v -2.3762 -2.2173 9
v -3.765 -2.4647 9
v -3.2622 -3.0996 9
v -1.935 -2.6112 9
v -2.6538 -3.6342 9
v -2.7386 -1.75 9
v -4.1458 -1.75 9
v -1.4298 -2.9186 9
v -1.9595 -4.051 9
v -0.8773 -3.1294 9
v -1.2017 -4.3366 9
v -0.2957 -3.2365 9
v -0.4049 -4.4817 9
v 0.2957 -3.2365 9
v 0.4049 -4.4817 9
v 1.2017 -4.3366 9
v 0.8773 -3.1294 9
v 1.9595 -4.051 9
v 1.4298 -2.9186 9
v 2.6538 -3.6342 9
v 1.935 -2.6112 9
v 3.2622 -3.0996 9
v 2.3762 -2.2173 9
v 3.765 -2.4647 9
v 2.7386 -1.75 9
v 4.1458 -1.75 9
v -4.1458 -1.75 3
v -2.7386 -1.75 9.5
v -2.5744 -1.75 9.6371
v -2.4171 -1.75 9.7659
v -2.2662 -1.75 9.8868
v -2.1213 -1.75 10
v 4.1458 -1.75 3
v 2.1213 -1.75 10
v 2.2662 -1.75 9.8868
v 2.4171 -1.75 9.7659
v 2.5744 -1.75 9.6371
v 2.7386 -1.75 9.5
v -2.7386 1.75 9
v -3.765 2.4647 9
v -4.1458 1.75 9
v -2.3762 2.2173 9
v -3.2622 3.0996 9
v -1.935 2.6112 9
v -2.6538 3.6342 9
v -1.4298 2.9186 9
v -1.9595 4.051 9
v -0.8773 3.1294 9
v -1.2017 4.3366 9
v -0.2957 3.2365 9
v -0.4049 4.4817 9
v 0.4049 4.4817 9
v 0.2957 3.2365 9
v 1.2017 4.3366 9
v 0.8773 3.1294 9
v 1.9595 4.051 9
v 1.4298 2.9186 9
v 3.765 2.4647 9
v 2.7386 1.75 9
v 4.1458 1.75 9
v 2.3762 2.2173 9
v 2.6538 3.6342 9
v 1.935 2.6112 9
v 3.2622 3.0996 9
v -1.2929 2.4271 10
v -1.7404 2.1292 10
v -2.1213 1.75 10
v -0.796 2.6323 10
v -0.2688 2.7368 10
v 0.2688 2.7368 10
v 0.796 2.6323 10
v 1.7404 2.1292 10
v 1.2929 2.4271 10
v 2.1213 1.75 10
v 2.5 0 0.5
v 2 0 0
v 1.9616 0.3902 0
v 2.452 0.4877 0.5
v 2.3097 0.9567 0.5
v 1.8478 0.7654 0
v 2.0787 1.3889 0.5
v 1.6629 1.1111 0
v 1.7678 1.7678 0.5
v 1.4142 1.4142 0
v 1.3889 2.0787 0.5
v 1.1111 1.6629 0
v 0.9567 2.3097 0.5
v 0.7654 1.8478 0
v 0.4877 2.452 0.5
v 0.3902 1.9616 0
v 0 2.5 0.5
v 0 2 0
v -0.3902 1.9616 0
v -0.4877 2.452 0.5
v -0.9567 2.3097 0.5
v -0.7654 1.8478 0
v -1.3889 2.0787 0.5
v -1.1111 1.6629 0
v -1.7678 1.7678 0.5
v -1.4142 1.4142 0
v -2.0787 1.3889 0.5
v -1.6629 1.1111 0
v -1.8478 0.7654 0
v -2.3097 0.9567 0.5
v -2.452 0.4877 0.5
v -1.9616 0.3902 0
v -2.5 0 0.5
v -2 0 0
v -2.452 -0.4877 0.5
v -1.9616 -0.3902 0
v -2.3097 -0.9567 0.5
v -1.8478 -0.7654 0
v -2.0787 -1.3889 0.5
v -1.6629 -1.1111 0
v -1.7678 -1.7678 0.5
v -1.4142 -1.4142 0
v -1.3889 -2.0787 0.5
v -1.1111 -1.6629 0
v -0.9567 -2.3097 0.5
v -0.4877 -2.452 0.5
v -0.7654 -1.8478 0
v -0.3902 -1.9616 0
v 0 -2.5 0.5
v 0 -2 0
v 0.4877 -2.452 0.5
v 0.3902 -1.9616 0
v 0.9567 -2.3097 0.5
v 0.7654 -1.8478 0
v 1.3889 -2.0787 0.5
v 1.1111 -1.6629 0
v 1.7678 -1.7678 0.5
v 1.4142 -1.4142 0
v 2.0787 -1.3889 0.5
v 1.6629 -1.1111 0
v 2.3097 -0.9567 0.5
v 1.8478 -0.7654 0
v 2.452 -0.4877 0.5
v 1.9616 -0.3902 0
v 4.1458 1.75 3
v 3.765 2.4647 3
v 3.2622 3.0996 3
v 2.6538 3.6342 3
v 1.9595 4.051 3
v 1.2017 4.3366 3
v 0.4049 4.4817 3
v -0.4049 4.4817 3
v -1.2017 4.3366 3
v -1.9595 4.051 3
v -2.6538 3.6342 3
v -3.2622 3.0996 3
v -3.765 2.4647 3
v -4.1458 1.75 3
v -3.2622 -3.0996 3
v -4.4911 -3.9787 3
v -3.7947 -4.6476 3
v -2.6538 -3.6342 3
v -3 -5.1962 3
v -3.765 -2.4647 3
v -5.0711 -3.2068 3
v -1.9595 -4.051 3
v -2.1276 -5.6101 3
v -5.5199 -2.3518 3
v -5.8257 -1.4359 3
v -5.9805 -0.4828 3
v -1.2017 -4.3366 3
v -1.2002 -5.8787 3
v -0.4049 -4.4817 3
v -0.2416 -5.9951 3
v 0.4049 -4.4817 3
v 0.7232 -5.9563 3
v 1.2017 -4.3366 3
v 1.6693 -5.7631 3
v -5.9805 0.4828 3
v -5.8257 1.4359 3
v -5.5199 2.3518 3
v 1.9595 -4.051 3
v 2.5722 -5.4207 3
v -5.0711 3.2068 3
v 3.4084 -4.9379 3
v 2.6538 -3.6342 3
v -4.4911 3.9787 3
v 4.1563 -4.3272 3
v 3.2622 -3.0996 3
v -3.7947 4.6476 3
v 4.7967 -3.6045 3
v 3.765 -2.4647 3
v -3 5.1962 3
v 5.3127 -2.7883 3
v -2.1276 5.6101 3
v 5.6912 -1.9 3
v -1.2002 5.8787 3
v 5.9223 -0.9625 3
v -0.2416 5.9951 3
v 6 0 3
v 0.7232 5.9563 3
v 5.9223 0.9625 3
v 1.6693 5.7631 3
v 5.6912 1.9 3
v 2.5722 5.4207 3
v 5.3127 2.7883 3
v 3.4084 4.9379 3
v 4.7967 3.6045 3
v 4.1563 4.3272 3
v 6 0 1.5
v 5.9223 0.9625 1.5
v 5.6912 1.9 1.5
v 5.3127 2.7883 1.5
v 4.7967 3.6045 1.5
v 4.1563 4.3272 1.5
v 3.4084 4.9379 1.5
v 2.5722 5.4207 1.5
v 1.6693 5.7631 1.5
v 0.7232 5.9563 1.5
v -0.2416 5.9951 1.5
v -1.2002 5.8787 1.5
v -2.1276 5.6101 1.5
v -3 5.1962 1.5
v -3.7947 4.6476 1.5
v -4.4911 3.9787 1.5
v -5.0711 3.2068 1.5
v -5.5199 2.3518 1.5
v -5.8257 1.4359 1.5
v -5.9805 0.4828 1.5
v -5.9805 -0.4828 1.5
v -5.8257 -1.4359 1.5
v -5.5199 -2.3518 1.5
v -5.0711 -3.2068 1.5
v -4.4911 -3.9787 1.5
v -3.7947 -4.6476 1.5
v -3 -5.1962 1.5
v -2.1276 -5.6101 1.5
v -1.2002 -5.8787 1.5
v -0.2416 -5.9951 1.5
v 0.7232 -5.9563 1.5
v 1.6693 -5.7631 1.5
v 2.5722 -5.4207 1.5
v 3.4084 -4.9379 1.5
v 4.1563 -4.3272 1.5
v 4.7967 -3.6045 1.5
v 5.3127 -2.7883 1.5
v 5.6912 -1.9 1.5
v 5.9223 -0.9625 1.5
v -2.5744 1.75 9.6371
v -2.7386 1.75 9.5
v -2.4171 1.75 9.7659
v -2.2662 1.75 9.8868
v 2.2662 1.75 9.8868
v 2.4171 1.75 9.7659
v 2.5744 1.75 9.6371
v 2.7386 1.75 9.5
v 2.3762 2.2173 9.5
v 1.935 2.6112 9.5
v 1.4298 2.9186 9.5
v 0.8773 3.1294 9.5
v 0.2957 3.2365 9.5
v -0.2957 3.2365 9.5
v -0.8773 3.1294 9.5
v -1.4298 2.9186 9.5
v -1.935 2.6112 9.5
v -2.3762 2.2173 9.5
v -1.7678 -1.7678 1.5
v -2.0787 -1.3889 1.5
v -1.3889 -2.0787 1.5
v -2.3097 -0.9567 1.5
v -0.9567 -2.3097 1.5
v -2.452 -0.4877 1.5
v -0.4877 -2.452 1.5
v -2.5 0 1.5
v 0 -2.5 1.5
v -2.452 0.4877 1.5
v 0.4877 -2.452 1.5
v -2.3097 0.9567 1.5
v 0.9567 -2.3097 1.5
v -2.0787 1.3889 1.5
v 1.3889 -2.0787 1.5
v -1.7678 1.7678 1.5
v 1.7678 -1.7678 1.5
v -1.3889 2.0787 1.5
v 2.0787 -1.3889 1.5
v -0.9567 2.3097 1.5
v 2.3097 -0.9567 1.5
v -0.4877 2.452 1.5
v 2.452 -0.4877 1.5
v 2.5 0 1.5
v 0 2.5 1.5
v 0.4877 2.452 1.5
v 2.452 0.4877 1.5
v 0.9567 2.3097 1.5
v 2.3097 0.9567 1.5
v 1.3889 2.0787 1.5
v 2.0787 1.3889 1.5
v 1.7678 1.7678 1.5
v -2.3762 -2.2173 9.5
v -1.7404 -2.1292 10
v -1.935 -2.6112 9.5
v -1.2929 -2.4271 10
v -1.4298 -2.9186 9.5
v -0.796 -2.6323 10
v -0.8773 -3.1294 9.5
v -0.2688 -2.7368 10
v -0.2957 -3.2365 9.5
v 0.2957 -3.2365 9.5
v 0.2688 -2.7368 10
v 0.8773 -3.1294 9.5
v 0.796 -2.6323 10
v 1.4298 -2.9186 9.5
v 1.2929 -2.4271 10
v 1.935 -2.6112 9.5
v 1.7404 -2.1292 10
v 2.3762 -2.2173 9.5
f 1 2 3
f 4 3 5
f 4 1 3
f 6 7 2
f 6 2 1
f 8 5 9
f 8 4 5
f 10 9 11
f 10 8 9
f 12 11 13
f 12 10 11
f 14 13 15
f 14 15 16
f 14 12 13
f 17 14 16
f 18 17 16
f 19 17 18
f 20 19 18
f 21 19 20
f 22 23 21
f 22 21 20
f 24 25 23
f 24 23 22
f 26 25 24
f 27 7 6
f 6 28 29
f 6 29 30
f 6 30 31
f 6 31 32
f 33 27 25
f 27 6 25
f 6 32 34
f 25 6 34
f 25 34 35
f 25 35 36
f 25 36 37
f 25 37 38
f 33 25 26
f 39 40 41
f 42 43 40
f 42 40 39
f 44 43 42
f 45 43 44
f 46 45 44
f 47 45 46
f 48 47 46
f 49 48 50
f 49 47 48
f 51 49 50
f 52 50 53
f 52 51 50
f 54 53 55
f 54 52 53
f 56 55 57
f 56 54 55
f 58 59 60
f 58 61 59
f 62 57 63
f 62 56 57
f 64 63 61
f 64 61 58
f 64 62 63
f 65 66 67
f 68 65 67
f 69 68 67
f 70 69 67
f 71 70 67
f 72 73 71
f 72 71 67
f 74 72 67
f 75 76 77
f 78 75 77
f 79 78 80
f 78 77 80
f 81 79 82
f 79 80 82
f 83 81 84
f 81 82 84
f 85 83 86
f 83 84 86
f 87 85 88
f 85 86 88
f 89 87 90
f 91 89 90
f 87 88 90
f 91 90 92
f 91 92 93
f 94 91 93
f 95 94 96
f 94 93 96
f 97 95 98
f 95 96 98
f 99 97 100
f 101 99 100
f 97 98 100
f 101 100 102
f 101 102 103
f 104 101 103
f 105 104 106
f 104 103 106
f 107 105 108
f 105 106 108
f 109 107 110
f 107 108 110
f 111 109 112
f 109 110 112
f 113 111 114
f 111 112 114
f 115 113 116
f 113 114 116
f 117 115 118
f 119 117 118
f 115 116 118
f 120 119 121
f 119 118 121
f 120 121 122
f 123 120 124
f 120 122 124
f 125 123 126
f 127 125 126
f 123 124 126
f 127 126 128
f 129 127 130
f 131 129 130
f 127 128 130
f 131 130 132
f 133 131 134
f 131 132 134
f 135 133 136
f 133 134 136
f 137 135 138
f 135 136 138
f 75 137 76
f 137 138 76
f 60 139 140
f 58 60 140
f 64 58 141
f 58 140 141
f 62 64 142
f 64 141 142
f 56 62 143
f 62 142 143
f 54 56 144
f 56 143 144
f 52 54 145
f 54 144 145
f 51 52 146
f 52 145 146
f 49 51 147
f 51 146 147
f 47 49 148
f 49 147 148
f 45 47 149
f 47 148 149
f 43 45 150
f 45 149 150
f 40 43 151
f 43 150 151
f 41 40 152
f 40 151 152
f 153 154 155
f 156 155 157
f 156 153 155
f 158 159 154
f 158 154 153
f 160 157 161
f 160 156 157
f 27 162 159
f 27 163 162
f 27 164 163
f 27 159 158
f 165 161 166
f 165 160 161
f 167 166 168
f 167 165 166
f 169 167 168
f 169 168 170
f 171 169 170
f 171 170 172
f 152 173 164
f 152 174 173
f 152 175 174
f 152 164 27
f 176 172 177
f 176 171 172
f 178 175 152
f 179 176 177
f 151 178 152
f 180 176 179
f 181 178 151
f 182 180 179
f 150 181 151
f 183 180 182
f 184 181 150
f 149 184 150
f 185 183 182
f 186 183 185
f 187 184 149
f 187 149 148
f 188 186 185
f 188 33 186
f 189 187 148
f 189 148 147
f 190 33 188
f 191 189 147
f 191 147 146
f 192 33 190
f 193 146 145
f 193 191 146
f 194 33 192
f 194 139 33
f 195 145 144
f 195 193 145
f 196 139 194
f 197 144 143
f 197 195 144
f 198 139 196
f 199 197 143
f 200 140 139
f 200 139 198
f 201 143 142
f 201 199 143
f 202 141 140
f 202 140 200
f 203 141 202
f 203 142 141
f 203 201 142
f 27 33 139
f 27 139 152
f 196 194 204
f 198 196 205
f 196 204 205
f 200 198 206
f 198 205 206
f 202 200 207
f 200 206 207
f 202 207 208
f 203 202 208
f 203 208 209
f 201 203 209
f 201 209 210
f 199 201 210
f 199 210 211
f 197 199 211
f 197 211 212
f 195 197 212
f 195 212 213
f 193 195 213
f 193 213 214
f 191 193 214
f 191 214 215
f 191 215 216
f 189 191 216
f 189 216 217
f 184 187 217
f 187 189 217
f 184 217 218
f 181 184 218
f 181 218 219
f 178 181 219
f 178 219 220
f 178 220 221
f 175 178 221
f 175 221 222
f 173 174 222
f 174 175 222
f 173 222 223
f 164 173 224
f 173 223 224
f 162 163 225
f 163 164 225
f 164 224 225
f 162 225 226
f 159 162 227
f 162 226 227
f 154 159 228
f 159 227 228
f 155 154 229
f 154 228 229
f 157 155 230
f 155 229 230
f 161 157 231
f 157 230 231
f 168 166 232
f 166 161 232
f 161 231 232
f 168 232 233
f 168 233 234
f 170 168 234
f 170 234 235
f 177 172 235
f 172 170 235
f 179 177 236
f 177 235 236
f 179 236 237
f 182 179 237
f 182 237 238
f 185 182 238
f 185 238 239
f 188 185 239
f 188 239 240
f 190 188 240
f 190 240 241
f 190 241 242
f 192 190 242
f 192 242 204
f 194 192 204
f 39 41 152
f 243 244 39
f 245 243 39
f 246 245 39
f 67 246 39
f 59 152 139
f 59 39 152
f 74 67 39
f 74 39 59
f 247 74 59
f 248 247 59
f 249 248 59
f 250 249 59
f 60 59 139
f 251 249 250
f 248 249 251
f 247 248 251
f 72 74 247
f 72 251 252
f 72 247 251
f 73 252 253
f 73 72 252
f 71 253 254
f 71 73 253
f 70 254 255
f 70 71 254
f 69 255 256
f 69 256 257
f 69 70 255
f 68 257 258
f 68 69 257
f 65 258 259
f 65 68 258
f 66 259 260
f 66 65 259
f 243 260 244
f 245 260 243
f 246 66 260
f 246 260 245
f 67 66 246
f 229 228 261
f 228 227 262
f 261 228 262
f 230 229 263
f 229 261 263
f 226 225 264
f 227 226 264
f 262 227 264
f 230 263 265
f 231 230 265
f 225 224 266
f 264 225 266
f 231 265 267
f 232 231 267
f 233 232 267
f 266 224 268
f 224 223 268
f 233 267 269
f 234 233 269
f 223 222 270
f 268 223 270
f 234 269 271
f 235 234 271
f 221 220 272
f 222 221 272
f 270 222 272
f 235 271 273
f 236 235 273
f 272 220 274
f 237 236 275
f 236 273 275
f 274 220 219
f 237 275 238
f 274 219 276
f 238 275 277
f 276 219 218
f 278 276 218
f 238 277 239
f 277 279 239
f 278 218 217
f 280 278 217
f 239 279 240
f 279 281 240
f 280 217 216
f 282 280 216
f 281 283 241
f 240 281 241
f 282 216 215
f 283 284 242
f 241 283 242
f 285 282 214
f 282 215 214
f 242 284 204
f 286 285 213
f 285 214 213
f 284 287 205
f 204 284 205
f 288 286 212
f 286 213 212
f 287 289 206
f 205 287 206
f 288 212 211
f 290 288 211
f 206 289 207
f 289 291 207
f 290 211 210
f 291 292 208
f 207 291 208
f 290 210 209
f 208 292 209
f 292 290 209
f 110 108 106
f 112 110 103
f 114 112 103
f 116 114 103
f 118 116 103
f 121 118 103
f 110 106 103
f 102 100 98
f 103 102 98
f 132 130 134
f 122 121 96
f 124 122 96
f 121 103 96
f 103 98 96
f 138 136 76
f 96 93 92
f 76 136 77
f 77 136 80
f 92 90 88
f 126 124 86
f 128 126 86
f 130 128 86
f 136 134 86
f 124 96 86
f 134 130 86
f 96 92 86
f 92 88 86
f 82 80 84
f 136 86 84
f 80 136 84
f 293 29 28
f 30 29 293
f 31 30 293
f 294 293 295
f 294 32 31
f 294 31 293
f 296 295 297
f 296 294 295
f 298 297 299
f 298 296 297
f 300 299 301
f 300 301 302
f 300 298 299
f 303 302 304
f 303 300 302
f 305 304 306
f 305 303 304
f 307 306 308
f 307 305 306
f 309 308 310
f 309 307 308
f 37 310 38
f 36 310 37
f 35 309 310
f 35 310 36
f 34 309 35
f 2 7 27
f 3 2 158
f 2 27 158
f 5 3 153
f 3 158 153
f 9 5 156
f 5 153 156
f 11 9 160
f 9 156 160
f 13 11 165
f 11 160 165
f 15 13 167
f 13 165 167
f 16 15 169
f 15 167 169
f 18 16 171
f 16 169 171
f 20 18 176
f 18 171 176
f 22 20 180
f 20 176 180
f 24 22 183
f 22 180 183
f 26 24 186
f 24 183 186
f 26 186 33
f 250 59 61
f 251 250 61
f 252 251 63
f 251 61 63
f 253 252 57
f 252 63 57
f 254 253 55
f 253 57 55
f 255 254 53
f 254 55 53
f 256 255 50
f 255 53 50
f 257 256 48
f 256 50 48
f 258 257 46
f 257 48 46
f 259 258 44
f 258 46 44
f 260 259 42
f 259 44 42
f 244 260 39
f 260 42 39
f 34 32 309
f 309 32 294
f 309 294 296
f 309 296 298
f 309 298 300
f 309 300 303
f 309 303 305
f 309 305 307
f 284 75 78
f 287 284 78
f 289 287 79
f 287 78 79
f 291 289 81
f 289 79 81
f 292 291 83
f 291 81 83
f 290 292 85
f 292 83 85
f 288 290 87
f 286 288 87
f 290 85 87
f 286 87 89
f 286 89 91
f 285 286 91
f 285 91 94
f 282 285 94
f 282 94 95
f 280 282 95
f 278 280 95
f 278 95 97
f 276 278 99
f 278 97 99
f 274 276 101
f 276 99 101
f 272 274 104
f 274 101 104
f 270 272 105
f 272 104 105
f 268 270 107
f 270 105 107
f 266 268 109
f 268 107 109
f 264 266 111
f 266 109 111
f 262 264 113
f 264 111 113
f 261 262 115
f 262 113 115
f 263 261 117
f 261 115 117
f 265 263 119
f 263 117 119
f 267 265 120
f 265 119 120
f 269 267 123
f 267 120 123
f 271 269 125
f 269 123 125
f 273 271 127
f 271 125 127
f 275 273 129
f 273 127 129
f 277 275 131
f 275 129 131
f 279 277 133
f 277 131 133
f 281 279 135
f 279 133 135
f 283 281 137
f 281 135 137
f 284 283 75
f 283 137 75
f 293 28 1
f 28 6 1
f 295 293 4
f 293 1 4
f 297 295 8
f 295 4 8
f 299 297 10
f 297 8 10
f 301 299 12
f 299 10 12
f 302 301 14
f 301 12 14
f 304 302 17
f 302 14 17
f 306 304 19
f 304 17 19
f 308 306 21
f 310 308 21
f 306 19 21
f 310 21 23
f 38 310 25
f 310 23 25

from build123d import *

# Parameters (mm, degrees)
SKETCH_1_R          = 2.5
EXTRUDE_1_DEPTH     = 1.5
SKETCH_3_R          = 6
EXTRUDE_2_DEPTH     = 1.5
SKETCH_4_R          = 4.5
EXTRUDE_3_DEPTH     = 6
SKETCH_5_R          = 3.25
EXTRUDE_4_DEPTH     = 1
CHAMFER_1_SIZE      = 0.5
CUT_EXTRUDE_1_REACH = 15.115
SKETCH_6_W          = 35.44
SKETCH_6_H          = 3.5


with BuildPart() as part:
    # 草图1 → 凸台-拉伸1 (new body)
    with BuildSketch(Plane.XY):
        Circle(SKETCH_1_R)
    extrude(amount=EXTRUDE_1_DEPTH)

    # 草图3 → 凸台-拉伸2 (add)
    with BuildSketch(Plane.XY.offset(1.5)):
        Circle(SKETCH_3_R)
    extrude(amount=EXTRUDE_2_DEPTH)

    # 草图4 → 凸台-拉伸3 (add)
    with BuildSketch(Plane.XY.offset(3)):
        Circle(SKETCH_4_R)
    extrude(amount=EXTRUDE_3_DEPTH)

    # 草图5 → 凸台-拉伸4 (add)
    with BuildSketch(Plane.XY.offset(9)):
        Circle(SKETCH_5_R)
    extrude(amount=EXTRUDE_4_DEPTH)

    # 倒角1
    chamfer_1_edges = [part.edges().sort_by_distance(p)[0] for p in [
        (-3.25, 0, 10),
        (-2.5, 0, 0),
    ]]
    chamfer(chamfer_1_edges, length=CHAMFER_1_SIZE)

    # 切除-拉伸1: up to this face of the body (flat: up to its plane)
    cut_extrude_1_end = Plane(part.part.faces().sort_by_distance((-5.830294373, 0, 3))[0])
    # 草图6 → 切除-拉伸1 (cut, up to the picked face)
    with BuildSketch(Plane.XY.offset(10), mode=Mode.PRIVATE) as cut_extrude_1_sk1:
        Rectangle(SKETCH_6_W, SKETCH_6_H)
    cut_extrude_1_tool1 = split(extrude(cut_extrude_1_sk1.sketch, amount=-CUT_EXTRUDE_1_REACH, mode=Mode.PRIVATE), bisect_by=cut_extrude_1_end, keep=Keep.BOTH, mode=Mode.PRIVATE)
    add(cut_extrude_1_tool1.solids().sort_by(Axis((0, 0, 10), (0, 0, -1)))[0], mode=Mode.SUBTRACT)


solid = part.part
